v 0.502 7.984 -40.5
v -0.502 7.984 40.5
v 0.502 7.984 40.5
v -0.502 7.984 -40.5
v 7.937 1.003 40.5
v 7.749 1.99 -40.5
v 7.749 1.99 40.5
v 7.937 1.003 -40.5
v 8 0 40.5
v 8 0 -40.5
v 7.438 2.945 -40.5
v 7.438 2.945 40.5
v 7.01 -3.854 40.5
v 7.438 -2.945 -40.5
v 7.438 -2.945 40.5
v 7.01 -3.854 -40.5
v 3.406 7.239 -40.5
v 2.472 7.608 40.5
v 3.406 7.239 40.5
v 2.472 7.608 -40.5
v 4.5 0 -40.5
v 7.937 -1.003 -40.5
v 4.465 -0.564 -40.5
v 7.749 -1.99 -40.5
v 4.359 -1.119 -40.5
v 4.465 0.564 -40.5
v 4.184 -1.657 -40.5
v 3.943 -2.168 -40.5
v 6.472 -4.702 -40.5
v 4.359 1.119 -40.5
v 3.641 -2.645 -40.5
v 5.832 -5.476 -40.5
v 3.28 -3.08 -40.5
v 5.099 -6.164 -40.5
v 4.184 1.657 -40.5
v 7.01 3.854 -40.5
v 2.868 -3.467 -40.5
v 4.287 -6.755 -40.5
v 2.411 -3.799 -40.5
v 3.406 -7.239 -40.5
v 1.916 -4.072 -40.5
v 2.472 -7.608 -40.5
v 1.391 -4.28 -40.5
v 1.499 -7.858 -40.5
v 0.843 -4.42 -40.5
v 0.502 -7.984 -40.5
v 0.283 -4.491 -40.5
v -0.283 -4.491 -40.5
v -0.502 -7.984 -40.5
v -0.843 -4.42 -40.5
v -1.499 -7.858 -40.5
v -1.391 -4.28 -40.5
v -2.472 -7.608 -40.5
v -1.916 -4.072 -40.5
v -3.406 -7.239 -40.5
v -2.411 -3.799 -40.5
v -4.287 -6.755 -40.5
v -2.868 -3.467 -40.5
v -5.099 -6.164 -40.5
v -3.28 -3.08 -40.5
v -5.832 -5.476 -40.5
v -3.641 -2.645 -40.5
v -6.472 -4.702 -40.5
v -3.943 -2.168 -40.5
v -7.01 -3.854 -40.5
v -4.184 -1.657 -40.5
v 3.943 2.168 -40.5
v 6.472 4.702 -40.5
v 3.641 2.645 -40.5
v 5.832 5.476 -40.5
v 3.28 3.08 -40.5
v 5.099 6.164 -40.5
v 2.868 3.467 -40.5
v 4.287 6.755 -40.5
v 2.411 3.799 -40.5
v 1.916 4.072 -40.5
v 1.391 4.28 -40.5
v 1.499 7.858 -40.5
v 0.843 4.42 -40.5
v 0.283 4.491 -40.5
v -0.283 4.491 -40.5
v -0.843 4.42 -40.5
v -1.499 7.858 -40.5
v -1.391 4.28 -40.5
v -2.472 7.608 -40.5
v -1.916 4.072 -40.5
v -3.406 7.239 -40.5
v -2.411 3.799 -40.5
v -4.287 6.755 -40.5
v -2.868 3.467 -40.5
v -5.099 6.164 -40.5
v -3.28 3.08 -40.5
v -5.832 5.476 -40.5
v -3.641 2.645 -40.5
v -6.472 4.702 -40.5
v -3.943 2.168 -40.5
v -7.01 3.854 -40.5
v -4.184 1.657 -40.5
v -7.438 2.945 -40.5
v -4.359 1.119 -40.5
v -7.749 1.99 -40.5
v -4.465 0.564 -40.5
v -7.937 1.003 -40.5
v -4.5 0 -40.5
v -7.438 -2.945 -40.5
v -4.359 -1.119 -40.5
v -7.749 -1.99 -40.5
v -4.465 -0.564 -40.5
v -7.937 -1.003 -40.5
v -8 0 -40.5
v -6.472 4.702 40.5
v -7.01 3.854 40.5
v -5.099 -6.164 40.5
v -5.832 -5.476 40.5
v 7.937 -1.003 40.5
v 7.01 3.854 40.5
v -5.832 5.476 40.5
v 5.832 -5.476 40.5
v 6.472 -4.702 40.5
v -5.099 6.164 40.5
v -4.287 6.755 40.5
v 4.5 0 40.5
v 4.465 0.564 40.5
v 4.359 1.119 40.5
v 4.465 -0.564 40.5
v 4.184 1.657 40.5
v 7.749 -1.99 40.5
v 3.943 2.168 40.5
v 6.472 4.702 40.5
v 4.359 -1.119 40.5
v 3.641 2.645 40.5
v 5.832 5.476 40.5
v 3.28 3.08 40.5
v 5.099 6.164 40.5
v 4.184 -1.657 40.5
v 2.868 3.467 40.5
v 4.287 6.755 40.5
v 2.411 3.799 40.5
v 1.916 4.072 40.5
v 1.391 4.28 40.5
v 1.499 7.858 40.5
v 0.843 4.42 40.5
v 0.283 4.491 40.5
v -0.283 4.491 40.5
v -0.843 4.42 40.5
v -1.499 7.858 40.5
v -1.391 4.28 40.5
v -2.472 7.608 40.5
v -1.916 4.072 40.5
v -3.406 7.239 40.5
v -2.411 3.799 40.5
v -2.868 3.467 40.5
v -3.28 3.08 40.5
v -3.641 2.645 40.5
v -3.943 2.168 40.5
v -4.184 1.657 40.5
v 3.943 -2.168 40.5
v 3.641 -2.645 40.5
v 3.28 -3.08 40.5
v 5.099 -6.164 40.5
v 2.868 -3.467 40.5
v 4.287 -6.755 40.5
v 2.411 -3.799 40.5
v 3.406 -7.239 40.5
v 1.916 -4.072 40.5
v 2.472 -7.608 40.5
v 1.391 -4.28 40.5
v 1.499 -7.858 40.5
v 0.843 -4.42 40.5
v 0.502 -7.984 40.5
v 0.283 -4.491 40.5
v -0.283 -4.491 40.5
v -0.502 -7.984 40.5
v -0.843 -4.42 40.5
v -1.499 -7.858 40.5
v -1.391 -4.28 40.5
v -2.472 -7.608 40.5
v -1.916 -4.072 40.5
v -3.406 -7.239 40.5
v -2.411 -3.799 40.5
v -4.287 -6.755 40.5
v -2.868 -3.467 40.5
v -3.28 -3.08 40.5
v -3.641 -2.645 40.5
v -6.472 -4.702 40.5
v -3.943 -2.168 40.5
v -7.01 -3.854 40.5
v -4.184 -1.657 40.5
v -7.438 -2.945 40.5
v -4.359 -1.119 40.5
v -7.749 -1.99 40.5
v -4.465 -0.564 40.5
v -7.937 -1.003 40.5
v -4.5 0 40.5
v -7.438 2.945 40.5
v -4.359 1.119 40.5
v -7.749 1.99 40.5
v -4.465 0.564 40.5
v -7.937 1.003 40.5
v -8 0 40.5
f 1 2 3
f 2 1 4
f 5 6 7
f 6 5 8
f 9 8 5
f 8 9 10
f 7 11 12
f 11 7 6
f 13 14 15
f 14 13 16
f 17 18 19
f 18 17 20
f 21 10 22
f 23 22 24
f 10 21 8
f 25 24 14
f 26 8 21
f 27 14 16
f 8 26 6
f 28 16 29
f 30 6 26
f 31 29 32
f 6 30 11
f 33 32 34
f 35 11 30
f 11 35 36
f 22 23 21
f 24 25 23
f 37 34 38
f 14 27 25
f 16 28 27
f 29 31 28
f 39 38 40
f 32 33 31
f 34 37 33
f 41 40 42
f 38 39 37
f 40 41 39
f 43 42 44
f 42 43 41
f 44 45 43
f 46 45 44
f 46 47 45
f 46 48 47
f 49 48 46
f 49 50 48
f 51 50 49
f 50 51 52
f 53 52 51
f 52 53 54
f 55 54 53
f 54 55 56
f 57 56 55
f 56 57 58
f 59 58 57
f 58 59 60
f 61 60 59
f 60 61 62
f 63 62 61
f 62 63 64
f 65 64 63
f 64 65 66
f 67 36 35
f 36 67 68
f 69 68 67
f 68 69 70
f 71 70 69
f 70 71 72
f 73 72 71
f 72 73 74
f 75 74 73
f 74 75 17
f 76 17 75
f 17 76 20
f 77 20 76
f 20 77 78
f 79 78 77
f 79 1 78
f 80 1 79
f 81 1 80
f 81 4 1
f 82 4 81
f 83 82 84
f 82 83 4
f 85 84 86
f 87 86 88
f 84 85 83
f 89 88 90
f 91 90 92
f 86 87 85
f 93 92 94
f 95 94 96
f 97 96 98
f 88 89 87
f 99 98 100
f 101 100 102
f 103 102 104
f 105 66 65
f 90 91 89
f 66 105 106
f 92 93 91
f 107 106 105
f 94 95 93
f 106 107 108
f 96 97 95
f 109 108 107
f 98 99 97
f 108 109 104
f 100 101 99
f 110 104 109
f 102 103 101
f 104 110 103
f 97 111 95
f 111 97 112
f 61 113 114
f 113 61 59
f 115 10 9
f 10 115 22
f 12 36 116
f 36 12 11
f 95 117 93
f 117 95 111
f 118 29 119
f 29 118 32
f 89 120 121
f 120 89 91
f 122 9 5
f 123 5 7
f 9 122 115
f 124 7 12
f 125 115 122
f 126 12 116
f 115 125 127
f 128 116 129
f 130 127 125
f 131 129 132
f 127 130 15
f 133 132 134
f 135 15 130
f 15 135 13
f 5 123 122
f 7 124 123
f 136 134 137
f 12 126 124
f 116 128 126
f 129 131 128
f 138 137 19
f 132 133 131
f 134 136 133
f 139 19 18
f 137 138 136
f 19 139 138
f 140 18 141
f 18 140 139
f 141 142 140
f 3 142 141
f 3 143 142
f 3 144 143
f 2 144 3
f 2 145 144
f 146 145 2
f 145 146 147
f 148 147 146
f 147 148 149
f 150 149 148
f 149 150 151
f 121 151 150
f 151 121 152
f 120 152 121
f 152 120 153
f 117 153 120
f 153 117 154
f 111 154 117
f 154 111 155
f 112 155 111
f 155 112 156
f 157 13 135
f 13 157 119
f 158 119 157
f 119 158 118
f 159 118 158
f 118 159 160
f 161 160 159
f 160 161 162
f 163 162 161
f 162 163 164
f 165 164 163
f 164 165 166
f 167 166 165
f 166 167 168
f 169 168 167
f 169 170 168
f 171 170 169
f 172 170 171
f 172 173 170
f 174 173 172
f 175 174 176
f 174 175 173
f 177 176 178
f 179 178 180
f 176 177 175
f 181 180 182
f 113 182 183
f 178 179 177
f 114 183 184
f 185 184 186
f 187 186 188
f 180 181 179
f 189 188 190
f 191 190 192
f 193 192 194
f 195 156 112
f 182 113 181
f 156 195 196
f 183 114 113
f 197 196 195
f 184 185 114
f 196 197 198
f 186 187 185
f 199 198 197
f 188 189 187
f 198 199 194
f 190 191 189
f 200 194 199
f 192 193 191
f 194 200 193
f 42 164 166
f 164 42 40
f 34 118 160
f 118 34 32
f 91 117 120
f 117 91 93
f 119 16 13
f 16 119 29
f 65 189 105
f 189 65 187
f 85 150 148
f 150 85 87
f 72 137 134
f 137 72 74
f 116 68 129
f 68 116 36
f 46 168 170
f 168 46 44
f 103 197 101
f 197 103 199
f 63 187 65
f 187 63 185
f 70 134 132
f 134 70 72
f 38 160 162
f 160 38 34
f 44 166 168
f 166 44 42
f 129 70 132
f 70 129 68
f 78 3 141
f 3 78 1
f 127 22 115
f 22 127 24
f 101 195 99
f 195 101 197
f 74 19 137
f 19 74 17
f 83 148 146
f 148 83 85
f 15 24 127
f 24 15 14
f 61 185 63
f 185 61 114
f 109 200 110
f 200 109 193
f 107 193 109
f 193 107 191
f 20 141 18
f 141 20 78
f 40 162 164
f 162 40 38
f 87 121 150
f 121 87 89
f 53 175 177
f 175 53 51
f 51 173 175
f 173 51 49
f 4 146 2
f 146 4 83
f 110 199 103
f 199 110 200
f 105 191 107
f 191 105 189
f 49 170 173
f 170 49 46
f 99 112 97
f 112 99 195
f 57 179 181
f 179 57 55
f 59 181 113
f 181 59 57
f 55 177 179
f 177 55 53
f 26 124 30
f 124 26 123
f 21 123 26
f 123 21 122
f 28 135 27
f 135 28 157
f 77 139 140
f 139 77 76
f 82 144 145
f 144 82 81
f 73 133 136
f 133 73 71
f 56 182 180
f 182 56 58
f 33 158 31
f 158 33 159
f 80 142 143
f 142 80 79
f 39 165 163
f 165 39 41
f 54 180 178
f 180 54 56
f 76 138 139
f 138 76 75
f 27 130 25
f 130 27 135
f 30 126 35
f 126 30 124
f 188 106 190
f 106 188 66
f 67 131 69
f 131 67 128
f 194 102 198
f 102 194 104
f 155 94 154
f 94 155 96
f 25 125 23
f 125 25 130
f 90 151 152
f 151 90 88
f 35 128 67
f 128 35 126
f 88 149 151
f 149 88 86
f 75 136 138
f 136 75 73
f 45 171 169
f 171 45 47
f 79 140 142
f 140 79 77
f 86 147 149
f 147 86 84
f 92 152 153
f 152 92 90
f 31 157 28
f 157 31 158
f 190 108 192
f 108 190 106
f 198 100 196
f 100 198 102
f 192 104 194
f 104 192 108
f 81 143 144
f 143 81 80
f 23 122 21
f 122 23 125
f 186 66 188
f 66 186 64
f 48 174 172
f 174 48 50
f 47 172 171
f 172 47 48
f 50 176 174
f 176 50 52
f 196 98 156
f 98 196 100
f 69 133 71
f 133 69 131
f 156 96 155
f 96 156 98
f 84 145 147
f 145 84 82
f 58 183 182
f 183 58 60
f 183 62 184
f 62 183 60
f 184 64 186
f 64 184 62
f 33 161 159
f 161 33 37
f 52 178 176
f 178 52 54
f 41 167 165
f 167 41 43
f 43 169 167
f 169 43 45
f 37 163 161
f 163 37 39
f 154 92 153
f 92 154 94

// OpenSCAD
$fn = 50;


difference() {
	union() {
		translate(v = [0, 0, -40.5000000000]) {
			cylinder(h = 81, r = 8.0000000000);
		}
	}
	union() {
		translate(v = [0, 0, -100.0000000000]) {
			cylinder(h = 200, r = 4.5000000000);
		}
	}
}
